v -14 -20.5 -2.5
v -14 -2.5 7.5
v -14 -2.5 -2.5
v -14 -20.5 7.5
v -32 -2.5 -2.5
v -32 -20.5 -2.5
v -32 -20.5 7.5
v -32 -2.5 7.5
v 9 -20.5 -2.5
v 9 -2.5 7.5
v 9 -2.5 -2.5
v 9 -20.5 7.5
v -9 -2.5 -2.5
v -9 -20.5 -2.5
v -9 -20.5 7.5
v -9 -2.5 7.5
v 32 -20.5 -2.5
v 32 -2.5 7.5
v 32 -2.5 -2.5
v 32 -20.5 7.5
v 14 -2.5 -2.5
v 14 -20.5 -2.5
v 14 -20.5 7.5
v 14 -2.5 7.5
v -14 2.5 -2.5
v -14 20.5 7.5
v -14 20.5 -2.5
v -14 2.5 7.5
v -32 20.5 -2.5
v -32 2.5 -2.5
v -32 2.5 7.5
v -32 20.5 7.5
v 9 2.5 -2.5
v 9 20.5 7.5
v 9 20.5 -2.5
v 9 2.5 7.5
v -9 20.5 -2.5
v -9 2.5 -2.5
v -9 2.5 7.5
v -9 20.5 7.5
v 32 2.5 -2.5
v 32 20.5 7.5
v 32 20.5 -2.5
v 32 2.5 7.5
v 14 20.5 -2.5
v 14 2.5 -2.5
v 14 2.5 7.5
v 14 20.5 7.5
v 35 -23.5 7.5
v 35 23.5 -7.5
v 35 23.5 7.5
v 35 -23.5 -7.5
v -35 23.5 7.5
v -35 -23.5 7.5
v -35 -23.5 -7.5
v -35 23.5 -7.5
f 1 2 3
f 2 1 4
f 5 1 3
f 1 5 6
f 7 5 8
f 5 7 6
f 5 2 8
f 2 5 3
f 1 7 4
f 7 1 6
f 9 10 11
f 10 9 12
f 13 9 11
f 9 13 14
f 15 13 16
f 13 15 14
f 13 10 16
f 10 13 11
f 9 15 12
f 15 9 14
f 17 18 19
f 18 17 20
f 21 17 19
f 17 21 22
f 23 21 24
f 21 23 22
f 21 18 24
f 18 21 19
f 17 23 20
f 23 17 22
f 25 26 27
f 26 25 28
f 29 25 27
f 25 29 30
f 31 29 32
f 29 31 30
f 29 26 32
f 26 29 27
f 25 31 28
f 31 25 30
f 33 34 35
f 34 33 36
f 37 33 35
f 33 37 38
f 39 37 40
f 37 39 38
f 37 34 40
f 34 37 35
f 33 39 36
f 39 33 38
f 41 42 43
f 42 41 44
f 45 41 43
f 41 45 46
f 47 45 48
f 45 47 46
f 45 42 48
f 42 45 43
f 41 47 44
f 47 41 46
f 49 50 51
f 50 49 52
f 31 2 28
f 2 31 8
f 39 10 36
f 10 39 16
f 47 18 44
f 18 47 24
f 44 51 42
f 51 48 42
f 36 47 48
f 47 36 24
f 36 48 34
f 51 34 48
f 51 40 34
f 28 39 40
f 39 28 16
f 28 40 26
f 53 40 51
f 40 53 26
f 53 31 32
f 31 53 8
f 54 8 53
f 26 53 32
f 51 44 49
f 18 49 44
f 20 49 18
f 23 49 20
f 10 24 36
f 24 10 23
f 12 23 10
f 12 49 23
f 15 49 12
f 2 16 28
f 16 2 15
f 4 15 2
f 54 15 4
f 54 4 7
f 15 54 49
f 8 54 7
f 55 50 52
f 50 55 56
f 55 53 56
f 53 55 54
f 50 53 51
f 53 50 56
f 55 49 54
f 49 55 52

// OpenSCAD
$fn = 32;

// ----------------------------------------------------------------------
// Pocket plate 70 x 47 x 15
// 2 x 3 pockets 18 mm square, 10 mm deep
// ----------------------------------------------------------------------

// --- parameters (mm) ---
thickness = 15;  // plate thickness
floor_t = 5;     // material left under each pocket
pocket = 18;     // pocket side length
pitch_x = 23;    // pocket pitch along X
pitch_y = 23;    // pocket pitch along Y
cols = 3;        // pockets per row
rows = 2;        // rows of pockets

// --- derived feature positions (mm) ---
depth = thickness - floor_t;        // = 10   pocket depth, down to the floor
span_x = (cols - 1) * pitch_x;      // = 46   distance between outer pockets
span_y = (rows - 1) * pitch_y;      // = 23   distance between outer pocket rows
origin_x = -span_x / 2;             // = -23   X of the first pocket
origin_y = -span_y / 2;             // = -11.5   Y of the first pocket
plate = [span_x + pocket + 6, span_y + pocket + 6, thickness];  // = [70, 47, 15]   overall size: pockets plus 3 mm of wall on each side
feature_centers = [
  [origin_x + 0 * pitch_x, origin_y + 0 * pitch_y],
  [origin_x + 1 * pitch_x, origin_y + 0 * pitch_y],
  [origin_x + 2 * pitch_x, origin_y + 0 * pitch_y],
  [origin_x + 0 * pitch_x, origin_y + 1 * pitch_y],
  [origin_x + 1 * pitch_x, origin_y + 1 * pitch_y],
  [origin_x + 2 * pitch_x, origin_y + 1 * pitch_y]
];   // pocket centres, used verbatim by the cutter loop

// plate outline, then one pocket per centre in feature_centers
difference() {
  cube(plate, center = true);
  for (centre = feature_centers)
    translate([centre[0] - pocket / 2, centre[1] - pocket / 2, plate[2] / 2 - depth])
      cube([pocket, pocket, depth + 1]);  // centred on the declared pocket centre
}
